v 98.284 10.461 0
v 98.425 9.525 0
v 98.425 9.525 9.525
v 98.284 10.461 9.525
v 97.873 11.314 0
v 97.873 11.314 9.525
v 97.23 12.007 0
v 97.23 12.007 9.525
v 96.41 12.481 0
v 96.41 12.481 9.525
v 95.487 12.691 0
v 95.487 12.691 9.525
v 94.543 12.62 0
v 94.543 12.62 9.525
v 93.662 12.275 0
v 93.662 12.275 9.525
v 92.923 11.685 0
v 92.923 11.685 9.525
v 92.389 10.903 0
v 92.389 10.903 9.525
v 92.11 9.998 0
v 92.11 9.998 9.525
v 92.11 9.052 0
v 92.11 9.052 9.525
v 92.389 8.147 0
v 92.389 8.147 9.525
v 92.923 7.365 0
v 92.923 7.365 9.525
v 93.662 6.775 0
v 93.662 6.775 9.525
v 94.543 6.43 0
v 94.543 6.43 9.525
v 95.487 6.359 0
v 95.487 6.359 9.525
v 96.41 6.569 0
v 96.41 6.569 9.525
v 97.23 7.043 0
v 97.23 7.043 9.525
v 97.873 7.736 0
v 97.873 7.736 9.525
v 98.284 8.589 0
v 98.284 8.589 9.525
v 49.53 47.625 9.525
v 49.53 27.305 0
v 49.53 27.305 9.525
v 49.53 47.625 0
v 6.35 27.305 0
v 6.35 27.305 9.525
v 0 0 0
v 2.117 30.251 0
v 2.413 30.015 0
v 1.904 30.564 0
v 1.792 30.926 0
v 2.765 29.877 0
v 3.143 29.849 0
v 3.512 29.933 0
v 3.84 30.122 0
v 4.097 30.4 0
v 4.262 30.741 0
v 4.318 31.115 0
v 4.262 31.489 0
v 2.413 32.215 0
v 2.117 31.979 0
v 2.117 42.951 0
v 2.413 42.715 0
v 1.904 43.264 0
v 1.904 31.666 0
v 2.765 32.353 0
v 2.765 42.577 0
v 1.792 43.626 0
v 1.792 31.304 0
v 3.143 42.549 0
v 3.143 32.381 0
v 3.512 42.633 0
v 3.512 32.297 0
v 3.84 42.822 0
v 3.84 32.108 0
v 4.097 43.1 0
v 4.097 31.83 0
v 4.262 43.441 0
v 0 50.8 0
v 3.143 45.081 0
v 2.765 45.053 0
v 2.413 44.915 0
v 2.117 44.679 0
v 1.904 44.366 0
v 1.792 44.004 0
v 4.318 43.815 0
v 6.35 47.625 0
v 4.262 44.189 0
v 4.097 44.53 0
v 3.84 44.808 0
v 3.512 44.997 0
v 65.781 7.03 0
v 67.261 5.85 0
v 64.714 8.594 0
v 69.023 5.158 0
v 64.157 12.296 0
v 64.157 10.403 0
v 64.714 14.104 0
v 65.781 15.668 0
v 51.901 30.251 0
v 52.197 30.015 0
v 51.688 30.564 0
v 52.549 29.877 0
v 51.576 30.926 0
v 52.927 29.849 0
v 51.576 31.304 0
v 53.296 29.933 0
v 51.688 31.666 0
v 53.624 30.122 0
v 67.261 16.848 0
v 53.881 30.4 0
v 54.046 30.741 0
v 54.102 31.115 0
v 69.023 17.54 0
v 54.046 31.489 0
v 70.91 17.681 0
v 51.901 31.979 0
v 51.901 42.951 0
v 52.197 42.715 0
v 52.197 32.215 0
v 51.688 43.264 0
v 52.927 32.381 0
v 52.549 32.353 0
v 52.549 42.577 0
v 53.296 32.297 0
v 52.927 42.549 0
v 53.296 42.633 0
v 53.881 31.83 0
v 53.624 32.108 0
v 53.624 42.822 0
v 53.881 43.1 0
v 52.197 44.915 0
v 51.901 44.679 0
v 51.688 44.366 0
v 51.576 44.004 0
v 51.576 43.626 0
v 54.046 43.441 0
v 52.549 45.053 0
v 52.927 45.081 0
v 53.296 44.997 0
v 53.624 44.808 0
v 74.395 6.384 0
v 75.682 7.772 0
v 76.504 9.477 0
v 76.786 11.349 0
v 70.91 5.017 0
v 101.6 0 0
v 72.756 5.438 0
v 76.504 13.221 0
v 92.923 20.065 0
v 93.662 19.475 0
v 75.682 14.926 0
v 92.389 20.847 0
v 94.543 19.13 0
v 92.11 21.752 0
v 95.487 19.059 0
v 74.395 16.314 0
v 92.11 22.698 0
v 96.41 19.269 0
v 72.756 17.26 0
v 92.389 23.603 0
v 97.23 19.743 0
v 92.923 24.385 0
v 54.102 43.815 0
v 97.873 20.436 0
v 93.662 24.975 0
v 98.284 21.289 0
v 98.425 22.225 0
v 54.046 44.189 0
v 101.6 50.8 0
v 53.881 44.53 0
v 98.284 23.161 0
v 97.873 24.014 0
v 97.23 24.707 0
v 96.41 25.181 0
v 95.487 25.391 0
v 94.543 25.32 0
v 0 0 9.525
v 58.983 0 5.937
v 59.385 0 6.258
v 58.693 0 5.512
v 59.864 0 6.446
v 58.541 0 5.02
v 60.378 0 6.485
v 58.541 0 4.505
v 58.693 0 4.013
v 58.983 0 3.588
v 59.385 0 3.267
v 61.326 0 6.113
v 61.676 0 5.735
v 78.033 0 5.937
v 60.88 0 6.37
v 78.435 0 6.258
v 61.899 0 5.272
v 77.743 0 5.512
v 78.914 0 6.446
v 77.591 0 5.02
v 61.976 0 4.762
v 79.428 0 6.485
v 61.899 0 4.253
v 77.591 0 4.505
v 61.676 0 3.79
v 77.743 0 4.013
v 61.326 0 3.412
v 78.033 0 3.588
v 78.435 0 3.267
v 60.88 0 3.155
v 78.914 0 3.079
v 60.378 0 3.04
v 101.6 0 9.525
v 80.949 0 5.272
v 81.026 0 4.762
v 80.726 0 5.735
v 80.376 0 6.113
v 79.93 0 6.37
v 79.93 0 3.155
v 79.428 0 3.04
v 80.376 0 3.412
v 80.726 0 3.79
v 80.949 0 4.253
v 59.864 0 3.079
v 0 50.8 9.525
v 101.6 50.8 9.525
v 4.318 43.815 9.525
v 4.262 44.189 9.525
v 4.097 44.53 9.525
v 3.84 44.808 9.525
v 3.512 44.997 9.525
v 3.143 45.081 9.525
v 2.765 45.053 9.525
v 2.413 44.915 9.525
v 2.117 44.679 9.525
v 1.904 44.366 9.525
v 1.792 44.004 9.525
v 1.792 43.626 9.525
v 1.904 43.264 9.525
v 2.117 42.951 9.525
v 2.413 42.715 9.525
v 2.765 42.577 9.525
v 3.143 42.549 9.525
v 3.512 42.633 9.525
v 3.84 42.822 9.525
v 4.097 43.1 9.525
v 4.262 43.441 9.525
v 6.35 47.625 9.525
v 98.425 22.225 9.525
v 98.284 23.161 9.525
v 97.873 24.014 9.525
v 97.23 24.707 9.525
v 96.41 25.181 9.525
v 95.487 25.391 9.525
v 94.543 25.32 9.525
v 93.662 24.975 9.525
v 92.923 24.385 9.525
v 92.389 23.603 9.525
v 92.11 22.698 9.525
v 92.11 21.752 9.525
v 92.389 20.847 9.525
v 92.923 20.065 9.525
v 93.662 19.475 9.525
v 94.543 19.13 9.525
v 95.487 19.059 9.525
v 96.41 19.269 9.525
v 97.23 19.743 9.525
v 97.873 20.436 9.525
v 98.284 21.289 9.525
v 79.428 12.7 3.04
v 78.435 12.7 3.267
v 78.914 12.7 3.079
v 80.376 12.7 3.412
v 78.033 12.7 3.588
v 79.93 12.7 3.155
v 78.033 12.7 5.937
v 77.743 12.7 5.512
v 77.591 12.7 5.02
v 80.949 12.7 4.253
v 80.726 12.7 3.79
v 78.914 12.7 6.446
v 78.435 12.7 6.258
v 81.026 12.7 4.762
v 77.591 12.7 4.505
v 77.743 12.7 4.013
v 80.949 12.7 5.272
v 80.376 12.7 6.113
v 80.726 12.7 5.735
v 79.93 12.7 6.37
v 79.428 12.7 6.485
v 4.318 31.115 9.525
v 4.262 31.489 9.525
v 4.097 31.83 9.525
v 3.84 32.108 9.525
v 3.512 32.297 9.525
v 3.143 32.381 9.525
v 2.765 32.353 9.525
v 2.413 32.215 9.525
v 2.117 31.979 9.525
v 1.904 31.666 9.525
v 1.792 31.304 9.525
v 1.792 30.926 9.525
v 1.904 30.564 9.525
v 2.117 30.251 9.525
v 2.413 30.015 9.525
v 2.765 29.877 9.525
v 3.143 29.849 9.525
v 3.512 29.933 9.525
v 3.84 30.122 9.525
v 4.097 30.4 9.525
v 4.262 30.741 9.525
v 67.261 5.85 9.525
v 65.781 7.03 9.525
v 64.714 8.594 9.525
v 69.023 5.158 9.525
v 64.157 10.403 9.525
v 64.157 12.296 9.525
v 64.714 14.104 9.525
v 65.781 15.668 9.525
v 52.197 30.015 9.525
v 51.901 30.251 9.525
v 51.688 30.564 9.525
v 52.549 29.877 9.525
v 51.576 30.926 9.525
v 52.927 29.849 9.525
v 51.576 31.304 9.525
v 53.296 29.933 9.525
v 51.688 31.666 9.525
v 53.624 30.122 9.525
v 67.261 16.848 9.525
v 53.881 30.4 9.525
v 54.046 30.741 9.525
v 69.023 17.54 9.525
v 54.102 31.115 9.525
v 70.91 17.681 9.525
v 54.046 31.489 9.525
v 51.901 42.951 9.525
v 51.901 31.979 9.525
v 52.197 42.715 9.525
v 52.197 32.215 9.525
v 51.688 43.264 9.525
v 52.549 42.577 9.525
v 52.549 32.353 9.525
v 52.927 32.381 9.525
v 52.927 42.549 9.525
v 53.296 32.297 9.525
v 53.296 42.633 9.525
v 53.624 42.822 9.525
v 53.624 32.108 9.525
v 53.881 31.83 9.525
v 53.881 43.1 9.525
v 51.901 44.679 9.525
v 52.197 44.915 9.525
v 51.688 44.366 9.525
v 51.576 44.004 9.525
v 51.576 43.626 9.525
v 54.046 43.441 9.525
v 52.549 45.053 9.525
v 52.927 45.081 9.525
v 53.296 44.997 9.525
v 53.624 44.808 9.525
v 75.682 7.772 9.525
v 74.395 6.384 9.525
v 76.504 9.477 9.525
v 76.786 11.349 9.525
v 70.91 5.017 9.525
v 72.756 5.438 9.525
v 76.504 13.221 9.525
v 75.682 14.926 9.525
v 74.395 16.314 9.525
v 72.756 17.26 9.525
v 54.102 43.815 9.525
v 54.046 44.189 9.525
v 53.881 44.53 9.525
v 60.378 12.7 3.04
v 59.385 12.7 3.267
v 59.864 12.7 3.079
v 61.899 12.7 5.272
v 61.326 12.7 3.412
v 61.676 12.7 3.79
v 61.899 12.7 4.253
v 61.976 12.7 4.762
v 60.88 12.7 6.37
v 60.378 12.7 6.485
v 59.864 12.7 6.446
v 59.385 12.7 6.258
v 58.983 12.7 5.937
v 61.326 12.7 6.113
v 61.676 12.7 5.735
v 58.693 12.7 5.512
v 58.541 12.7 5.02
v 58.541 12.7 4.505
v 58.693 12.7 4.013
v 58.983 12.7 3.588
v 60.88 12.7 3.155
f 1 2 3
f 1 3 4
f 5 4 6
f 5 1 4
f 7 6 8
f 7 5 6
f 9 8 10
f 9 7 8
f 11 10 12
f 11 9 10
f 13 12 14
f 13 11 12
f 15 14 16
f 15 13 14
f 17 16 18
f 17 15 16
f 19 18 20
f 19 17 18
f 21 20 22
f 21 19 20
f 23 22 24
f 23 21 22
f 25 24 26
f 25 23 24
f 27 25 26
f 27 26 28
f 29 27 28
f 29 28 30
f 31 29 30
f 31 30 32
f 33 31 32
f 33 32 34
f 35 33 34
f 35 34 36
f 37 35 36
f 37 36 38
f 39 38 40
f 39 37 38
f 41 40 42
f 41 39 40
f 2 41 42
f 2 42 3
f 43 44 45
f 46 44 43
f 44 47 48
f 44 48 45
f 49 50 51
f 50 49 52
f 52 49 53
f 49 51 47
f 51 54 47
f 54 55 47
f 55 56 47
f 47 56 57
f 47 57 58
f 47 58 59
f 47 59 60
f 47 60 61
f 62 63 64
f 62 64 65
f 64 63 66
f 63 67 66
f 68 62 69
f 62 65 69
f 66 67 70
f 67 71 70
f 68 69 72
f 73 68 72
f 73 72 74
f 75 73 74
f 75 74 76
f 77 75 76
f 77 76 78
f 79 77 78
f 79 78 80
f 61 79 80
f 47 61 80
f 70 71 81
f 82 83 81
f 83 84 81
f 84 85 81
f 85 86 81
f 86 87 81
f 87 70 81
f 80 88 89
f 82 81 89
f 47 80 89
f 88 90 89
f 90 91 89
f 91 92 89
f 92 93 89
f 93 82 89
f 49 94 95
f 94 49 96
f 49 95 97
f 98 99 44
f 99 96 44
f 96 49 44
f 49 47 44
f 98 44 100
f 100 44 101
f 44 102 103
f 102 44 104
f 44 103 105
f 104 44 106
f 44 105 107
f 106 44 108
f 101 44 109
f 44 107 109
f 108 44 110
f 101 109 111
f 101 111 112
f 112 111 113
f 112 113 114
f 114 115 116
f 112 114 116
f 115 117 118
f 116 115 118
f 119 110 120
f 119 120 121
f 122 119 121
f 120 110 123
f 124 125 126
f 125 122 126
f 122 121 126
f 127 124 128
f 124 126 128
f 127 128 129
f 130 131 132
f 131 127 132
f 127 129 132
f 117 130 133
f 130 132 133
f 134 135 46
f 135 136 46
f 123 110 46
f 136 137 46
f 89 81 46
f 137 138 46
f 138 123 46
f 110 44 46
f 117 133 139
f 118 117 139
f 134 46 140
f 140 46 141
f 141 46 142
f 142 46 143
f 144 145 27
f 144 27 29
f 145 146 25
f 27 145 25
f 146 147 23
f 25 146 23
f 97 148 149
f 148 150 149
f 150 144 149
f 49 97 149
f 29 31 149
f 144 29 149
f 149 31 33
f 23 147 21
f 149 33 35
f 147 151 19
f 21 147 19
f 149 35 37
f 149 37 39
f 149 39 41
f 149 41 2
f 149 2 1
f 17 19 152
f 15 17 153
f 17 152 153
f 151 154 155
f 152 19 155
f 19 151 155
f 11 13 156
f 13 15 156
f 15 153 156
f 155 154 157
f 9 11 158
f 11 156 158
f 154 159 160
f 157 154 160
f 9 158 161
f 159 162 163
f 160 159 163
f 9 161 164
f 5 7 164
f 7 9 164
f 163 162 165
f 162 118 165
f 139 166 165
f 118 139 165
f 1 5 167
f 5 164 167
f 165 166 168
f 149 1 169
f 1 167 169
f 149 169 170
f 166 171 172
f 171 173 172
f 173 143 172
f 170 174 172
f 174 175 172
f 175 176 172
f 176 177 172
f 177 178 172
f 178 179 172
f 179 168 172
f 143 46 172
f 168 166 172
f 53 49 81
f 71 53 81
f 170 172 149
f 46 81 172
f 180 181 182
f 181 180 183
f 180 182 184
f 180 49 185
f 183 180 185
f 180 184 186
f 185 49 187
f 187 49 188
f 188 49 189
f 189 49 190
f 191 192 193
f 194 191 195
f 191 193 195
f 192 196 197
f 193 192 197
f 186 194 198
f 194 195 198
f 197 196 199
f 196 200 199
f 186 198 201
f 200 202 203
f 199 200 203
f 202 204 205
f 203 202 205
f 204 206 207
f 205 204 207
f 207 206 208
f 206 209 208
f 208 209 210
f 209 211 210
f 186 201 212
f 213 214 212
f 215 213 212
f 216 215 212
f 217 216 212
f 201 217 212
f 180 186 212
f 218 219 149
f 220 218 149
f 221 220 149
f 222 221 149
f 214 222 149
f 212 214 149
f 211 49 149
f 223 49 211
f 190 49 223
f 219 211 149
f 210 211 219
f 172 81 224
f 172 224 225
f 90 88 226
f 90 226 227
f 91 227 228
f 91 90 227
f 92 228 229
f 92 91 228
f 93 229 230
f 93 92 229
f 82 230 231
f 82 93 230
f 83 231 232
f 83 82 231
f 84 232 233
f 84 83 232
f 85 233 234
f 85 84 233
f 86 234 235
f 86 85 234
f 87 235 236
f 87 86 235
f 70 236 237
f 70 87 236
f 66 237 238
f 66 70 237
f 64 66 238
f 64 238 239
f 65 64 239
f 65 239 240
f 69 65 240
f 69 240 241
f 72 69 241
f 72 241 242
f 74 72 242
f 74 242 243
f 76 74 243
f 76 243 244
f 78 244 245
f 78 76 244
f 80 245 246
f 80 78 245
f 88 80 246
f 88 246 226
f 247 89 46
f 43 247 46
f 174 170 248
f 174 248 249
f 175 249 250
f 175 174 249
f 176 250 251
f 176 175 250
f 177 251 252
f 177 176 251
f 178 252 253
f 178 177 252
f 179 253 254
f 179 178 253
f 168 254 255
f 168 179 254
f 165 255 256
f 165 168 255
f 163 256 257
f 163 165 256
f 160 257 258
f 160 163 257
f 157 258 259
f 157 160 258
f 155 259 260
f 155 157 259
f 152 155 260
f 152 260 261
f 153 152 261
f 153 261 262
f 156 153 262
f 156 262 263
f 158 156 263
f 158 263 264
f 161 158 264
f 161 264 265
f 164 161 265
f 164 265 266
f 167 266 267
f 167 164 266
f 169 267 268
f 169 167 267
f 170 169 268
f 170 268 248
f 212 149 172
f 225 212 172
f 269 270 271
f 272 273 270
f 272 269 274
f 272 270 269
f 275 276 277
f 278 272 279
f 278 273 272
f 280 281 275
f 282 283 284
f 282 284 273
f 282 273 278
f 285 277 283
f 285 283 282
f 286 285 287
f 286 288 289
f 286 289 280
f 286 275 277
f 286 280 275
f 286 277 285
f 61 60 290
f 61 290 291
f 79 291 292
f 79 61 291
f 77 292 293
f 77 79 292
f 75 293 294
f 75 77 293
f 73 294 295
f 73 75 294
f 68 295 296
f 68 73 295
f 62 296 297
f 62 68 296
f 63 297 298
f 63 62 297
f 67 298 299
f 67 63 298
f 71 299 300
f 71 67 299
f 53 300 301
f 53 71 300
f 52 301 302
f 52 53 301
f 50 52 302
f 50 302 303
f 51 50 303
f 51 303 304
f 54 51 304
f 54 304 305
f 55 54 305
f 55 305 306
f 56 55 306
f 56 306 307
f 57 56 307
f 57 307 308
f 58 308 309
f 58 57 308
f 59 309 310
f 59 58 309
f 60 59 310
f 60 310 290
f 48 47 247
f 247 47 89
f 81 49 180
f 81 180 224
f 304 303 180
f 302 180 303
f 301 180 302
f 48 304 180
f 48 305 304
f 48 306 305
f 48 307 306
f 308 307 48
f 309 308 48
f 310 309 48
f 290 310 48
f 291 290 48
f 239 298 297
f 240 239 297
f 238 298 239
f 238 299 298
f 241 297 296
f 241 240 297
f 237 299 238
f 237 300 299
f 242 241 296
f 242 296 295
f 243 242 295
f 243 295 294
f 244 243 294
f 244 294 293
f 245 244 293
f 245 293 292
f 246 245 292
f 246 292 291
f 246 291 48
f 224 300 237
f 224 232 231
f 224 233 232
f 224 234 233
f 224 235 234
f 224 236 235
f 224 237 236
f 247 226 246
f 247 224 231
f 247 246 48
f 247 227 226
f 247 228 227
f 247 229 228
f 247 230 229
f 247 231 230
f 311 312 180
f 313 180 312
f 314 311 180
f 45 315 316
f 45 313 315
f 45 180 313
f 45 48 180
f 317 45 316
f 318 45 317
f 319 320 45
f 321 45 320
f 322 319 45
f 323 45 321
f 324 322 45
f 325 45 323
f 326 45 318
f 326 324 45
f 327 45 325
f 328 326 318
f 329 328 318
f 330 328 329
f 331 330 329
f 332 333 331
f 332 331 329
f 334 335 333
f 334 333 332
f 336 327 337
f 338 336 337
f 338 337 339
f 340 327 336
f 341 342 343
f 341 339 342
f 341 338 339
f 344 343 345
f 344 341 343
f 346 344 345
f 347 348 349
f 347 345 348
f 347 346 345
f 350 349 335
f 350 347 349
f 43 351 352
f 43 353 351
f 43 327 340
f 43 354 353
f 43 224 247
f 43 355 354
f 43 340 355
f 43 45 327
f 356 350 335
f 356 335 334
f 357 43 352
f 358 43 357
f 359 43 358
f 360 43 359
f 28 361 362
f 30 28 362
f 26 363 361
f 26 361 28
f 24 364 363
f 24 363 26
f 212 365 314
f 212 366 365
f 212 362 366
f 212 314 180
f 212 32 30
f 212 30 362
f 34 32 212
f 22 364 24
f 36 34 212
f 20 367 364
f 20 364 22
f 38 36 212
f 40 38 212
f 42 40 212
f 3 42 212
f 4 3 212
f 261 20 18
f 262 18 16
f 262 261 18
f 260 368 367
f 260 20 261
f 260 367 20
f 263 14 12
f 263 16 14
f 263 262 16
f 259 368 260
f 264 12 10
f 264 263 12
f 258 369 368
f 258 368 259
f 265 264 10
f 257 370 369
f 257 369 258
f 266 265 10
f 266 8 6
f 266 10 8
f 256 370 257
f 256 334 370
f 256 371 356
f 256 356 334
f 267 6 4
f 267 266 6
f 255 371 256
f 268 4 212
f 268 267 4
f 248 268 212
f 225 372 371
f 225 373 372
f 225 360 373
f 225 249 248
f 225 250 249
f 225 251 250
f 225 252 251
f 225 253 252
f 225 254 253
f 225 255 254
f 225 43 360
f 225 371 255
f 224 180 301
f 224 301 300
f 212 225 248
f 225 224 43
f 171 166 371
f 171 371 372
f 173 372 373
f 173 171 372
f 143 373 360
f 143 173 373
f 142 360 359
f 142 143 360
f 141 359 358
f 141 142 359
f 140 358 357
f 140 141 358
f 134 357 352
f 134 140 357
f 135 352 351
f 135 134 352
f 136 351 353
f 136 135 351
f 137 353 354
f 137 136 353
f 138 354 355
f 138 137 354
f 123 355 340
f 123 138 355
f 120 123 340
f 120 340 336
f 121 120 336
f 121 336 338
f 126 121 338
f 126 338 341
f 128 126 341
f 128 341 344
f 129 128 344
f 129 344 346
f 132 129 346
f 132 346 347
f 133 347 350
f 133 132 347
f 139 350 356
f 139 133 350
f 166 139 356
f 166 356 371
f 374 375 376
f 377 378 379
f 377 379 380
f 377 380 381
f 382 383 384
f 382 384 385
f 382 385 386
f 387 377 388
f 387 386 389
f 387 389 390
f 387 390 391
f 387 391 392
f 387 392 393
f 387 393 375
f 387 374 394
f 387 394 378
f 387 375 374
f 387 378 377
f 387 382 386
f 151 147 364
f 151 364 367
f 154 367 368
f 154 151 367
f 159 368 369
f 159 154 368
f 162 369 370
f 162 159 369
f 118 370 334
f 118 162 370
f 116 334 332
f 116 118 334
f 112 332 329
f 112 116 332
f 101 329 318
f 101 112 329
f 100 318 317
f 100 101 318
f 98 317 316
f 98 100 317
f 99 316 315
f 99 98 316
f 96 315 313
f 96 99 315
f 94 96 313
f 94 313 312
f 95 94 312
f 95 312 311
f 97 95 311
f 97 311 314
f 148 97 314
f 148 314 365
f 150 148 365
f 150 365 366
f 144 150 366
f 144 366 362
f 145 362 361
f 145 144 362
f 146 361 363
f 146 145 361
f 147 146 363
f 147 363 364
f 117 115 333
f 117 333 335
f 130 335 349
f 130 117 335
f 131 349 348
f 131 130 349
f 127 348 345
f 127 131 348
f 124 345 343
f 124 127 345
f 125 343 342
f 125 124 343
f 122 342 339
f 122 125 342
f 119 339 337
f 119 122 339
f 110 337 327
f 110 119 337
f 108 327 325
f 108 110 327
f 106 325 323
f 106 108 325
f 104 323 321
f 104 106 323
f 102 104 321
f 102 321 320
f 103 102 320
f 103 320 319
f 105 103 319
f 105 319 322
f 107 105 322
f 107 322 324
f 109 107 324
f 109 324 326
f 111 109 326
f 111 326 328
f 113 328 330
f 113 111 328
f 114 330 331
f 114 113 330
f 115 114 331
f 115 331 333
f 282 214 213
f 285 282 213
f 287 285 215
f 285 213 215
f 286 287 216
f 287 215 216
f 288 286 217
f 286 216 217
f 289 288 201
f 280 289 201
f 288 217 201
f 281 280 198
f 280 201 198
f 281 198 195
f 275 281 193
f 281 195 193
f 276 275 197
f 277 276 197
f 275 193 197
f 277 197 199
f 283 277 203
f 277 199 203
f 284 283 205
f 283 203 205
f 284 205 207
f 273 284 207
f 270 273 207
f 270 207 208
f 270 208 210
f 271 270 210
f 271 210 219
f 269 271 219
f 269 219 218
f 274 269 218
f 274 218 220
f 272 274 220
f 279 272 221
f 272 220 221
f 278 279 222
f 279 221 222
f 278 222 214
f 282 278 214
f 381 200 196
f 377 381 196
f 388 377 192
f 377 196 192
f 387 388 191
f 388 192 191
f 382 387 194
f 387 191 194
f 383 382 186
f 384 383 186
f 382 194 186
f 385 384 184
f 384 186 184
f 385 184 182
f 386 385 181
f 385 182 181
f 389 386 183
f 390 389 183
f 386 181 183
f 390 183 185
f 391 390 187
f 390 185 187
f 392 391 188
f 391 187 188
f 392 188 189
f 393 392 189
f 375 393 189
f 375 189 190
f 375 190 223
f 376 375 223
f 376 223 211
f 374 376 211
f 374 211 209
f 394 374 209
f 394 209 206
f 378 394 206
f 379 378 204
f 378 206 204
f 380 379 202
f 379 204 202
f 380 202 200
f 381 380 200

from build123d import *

# Parameters (mm, degrees)
SKETCH1_W           = 101.6
SKETCH1_H           = 50.8
SKETCH1_R           = 3.175
SKETCH1_R_2         = 1.27
SKETCH1_R_3         = 6.35
SKETCH1_W_2         = 43.18
SKETCH1_H_2         = 20.32
BOSS_EXTRUDE1_DEPTH = 9.525
SKETCH2_R           = 1.7272
CUT_EXTRUDE1_DEPTH  = 12.7


with BuildPart() as part:
    # Sketch1 → Boss-Extrude1 (new body)
    with BuildSketch(Plane.XY):
        with Locations((50.8, 25.4)):
            Rectangle(SKETCH1_W, SKETCH1_H)
        with Locations((95.25, 22.225)):
            Circle(SKETCH1_R, mode=Mode.SUBTRACT)
        with Locations((95.25, 9.525)):
            Circle(SKETCH1_R, mode=Mode.SUBTRACT)
        with Locations((3.048, 43.815)):
            Circle(SKETCH1_R_2, mode=Mode.SUBTRACT)
        with Locations((3.048, 31.115)):
            Circle(SKETCH1_R_2, mode=Mode.SUBTRACT)
        with Locations((52.832, 43.815)):
            Circle(SKETCH1_R_2, mode=Mode.SUBTRACT)
        with Locations((52.832, 31.115)):
            Circle(SKETCH1_R_2, mode=Mode.SUBTRACT)
        with Locations((70.435623446, 11.349127288)):
            Circle(SKETCH1_R_3, mode=Mode.SUBTRACT)
        with Locations((27.94, 37.465)):
            Rectangle(SKETCH1_W_2, SKETCH1_H_2, mode=Mode.SUBTRACT)
    extrude(amount=BOSS_EXTRUDE1_DEPTH)

    # Sketch2 → Cut-Extrude1 (cut)
    with BuildSketch(Plane.XZ):
        with Locations((60.2488, 4.7625)):
            Circle(SKETCH2_R)
        with Locations((79.2988, 4.7625)):
            Circle(SKETCH2_R)
    extrude(amount=-CUT_EXTRUDE1_DEPTH, mode=Mode.SUBTRACT)


solid = part.part
